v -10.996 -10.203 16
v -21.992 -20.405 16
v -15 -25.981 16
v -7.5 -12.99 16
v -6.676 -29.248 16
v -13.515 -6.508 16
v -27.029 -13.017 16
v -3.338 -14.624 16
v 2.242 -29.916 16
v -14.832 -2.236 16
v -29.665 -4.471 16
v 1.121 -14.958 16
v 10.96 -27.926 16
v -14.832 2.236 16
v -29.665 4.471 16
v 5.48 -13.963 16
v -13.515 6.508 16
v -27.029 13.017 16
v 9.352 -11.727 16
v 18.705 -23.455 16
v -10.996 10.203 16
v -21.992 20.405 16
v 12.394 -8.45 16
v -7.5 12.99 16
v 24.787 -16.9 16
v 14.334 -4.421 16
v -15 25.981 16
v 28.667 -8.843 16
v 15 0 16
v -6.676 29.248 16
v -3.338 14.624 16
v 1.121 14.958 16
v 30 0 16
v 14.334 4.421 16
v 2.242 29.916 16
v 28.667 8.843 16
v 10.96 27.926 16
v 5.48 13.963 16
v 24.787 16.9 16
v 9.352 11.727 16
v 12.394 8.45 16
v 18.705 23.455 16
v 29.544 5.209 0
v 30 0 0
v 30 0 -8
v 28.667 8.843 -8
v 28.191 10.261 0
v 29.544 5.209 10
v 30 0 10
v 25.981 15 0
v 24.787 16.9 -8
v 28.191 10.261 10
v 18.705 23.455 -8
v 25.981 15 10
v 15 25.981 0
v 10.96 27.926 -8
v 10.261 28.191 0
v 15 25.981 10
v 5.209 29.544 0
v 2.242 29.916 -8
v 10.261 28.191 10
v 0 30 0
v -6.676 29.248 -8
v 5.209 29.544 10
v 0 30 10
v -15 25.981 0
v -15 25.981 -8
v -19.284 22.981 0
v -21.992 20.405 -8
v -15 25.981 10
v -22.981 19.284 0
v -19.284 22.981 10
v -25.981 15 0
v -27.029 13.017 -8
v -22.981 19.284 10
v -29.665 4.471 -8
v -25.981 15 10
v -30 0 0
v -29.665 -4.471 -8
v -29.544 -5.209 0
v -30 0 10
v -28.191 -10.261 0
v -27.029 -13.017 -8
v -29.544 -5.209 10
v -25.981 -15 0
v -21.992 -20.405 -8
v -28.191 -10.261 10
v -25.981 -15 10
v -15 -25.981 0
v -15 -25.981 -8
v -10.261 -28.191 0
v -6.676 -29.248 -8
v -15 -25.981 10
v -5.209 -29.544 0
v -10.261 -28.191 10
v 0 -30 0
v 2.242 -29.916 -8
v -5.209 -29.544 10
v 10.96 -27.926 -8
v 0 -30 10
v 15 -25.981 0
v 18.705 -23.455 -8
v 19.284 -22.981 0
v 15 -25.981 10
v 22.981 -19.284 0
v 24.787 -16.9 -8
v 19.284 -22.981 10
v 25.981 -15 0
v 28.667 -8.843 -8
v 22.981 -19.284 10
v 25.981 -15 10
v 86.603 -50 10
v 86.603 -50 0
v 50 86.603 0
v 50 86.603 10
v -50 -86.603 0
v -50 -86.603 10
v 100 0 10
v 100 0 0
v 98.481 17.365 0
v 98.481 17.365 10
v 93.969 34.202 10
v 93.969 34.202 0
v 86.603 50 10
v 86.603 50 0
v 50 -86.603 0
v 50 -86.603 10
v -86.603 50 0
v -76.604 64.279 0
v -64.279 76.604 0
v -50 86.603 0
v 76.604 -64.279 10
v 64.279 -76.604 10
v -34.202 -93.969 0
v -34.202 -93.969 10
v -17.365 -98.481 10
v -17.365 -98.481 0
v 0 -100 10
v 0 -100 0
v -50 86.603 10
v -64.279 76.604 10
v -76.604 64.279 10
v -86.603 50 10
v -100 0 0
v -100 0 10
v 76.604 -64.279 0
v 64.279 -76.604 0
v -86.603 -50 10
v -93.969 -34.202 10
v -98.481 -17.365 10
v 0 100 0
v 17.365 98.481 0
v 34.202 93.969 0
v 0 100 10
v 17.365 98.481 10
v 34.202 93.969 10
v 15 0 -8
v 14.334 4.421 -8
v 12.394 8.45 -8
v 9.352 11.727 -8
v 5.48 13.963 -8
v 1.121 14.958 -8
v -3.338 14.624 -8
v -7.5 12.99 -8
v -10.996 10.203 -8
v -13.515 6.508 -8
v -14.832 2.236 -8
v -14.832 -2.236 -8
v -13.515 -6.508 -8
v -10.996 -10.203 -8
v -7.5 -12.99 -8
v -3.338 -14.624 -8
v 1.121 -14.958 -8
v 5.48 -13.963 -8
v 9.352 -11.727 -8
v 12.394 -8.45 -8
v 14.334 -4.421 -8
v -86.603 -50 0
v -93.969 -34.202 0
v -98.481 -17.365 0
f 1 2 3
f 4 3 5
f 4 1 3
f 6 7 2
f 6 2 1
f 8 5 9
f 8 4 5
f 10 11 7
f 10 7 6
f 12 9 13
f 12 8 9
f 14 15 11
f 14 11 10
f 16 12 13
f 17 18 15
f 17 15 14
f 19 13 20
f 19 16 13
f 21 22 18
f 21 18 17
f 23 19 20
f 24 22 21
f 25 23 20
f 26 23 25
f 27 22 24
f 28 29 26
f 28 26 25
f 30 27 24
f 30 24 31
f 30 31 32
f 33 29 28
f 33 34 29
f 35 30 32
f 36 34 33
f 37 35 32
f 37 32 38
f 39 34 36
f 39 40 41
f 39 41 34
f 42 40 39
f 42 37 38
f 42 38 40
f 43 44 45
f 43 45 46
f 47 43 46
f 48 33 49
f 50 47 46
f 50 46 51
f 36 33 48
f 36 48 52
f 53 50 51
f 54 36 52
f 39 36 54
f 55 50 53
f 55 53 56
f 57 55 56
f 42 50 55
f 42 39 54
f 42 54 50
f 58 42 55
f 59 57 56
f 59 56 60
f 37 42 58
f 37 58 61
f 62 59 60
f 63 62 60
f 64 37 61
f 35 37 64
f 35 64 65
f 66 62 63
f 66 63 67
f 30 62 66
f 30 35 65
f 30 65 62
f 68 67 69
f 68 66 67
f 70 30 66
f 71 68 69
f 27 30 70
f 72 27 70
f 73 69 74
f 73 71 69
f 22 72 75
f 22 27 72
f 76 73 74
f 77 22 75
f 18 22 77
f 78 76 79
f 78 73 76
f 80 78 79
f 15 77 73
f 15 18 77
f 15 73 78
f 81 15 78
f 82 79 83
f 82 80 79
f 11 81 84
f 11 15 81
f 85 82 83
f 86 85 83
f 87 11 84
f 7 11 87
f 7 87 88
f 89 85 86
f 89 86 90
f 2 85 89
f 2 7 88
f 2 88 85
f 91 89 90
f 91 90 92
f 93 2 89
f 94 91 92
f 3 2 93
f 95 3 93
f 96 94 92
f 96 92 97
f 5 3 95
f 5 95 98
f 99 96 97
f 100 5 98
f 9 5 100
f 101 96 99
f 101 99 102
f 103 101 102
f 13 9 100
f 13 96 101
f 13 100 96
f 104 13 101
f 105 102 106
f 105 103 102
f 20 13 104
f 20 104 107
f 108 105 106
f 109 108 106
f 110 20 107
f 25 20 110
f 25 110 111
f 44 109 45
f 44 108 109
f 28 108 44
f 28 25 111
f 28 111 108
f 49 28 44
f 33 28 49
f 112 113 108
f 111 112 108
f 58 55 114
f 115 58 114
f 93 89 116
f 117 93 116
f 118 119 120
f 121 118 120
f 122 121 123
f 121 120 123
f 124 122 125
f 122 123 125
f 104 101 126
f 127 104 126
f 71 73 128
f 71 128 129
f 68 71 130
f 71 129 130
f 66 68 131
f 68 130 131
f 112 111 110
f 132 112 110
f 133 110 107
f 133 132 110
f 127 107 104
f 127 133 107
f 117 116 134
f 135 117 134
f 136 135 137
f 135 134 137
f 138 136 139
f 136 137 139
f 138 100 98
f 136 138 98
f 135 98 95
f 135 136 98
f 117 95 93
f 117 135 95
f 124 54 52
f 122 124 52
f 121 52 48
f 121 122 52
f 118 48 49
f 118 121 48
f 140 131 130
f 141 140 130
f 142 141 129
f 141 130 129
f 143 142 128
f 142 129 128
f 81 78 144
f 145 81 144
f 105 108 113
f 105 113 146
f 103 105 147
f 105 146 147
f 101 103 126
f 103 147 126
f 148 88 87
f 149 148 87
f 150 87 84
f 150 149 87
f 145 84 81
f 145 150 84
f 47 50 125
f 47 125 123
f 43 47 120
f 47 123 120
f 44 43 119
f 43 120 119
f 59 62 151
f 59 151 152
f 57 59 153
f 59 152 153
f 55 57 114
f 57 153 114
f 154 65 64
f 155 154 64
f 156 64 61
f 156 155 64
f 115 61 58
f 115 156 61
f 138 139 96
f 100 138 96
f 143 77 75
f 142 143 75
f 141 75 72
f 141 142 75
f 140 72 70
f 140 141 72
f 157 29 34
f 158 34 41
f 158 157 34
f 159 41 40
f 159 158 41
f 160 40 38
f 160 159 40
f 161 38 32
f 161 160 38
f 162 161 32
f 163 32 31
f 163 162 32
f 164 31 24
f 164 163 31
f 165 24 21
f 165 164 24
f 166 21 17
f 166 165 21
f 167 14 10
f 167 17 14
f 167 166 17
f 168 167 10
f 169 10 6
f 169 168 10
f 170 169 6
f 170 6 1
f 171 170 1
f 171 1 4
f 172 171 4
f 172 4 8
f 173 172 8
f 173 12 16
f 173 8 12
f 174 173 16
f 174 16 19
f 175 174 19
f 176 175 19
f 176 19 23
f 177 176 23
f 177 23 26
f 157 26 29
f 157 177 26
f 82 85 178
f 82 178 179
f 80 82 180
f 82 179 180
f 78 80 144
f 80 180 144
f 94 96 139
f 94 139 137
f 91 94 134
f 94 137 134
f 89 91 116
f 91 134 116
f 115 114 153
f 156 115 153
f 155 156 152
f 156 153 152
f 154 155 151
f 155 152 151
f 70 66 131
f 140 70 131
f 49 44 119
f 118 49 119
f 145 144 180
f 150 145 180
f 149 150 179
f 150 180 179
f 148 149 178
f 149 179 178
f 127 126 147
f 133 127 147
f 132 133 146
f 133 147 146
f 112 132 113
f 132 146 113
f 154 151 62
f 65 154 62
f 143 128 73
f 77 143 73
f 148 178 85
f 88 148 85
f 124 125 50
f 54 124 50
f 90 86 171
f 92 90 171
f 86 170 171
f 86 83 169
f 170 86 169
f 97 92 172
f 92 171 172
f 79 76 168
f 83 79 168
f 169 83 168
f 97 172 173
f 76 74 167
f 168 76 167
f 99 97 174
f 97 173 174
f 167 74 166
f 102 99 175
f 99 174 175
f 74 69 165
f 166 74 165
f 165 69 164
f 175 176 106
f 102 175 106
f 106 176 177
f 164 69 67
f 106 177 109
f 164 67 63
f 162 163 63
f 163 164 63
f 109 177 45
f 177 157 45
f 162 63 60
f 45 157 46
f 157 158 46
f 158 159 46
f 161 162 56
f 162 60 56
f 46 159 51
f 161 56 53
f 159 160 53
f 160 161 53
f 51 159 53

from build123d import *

# Parameters (mm, degrees)
F0_R          = 30
F0_R_2        = 15
F1_DEPTH      = 16
F1_DEPTH_BACK = 8
F3_DEPTH      = 10
F5_COUNT      = 6


with BuildPart() as f1:
    # F0 (on Top) → F1 (new body, two sides)
    with BuildSketch(Plane.XY) as f1_sk:
        Circle(F0_R)
        Circle(F0_R_2, mode=Mode.SUBTRACT)
    extrude(amount=F1_DEPTH)
    extrude(f1_sk.sketch, amount=-F1_DEPTH_BACK)

    # F2 (on Top) → F3 (join)
    with BuildSketch(Plane.XY):
        with BuildLine():
            Line((15, 25.9807621135), (50, 86.6025403784))
            ThreePointArc((50, 86.6025403784), (25.8819045103, 96.5925826289), (0, 100))
            Line((0, 100), (0, 30))
            ThreePointArc((0, 30), (7.7645713531, 28.9777747887), (15, 25.9807621135))
        make_face()
    extrude(amount=F3_DEPTH)

    # F5: F1 ×6 about axis
    f5_axis = Axis((0, 0, 6.2121879309), (0, 0, -1))


with BuildPart() as f1_1:
    add(f1.part)
    for i in range(1, F5_COUNT):
        add(f1.part.rotate(f5_axis, i * 360 / F5_COUNT))


solid = f1_1.part
